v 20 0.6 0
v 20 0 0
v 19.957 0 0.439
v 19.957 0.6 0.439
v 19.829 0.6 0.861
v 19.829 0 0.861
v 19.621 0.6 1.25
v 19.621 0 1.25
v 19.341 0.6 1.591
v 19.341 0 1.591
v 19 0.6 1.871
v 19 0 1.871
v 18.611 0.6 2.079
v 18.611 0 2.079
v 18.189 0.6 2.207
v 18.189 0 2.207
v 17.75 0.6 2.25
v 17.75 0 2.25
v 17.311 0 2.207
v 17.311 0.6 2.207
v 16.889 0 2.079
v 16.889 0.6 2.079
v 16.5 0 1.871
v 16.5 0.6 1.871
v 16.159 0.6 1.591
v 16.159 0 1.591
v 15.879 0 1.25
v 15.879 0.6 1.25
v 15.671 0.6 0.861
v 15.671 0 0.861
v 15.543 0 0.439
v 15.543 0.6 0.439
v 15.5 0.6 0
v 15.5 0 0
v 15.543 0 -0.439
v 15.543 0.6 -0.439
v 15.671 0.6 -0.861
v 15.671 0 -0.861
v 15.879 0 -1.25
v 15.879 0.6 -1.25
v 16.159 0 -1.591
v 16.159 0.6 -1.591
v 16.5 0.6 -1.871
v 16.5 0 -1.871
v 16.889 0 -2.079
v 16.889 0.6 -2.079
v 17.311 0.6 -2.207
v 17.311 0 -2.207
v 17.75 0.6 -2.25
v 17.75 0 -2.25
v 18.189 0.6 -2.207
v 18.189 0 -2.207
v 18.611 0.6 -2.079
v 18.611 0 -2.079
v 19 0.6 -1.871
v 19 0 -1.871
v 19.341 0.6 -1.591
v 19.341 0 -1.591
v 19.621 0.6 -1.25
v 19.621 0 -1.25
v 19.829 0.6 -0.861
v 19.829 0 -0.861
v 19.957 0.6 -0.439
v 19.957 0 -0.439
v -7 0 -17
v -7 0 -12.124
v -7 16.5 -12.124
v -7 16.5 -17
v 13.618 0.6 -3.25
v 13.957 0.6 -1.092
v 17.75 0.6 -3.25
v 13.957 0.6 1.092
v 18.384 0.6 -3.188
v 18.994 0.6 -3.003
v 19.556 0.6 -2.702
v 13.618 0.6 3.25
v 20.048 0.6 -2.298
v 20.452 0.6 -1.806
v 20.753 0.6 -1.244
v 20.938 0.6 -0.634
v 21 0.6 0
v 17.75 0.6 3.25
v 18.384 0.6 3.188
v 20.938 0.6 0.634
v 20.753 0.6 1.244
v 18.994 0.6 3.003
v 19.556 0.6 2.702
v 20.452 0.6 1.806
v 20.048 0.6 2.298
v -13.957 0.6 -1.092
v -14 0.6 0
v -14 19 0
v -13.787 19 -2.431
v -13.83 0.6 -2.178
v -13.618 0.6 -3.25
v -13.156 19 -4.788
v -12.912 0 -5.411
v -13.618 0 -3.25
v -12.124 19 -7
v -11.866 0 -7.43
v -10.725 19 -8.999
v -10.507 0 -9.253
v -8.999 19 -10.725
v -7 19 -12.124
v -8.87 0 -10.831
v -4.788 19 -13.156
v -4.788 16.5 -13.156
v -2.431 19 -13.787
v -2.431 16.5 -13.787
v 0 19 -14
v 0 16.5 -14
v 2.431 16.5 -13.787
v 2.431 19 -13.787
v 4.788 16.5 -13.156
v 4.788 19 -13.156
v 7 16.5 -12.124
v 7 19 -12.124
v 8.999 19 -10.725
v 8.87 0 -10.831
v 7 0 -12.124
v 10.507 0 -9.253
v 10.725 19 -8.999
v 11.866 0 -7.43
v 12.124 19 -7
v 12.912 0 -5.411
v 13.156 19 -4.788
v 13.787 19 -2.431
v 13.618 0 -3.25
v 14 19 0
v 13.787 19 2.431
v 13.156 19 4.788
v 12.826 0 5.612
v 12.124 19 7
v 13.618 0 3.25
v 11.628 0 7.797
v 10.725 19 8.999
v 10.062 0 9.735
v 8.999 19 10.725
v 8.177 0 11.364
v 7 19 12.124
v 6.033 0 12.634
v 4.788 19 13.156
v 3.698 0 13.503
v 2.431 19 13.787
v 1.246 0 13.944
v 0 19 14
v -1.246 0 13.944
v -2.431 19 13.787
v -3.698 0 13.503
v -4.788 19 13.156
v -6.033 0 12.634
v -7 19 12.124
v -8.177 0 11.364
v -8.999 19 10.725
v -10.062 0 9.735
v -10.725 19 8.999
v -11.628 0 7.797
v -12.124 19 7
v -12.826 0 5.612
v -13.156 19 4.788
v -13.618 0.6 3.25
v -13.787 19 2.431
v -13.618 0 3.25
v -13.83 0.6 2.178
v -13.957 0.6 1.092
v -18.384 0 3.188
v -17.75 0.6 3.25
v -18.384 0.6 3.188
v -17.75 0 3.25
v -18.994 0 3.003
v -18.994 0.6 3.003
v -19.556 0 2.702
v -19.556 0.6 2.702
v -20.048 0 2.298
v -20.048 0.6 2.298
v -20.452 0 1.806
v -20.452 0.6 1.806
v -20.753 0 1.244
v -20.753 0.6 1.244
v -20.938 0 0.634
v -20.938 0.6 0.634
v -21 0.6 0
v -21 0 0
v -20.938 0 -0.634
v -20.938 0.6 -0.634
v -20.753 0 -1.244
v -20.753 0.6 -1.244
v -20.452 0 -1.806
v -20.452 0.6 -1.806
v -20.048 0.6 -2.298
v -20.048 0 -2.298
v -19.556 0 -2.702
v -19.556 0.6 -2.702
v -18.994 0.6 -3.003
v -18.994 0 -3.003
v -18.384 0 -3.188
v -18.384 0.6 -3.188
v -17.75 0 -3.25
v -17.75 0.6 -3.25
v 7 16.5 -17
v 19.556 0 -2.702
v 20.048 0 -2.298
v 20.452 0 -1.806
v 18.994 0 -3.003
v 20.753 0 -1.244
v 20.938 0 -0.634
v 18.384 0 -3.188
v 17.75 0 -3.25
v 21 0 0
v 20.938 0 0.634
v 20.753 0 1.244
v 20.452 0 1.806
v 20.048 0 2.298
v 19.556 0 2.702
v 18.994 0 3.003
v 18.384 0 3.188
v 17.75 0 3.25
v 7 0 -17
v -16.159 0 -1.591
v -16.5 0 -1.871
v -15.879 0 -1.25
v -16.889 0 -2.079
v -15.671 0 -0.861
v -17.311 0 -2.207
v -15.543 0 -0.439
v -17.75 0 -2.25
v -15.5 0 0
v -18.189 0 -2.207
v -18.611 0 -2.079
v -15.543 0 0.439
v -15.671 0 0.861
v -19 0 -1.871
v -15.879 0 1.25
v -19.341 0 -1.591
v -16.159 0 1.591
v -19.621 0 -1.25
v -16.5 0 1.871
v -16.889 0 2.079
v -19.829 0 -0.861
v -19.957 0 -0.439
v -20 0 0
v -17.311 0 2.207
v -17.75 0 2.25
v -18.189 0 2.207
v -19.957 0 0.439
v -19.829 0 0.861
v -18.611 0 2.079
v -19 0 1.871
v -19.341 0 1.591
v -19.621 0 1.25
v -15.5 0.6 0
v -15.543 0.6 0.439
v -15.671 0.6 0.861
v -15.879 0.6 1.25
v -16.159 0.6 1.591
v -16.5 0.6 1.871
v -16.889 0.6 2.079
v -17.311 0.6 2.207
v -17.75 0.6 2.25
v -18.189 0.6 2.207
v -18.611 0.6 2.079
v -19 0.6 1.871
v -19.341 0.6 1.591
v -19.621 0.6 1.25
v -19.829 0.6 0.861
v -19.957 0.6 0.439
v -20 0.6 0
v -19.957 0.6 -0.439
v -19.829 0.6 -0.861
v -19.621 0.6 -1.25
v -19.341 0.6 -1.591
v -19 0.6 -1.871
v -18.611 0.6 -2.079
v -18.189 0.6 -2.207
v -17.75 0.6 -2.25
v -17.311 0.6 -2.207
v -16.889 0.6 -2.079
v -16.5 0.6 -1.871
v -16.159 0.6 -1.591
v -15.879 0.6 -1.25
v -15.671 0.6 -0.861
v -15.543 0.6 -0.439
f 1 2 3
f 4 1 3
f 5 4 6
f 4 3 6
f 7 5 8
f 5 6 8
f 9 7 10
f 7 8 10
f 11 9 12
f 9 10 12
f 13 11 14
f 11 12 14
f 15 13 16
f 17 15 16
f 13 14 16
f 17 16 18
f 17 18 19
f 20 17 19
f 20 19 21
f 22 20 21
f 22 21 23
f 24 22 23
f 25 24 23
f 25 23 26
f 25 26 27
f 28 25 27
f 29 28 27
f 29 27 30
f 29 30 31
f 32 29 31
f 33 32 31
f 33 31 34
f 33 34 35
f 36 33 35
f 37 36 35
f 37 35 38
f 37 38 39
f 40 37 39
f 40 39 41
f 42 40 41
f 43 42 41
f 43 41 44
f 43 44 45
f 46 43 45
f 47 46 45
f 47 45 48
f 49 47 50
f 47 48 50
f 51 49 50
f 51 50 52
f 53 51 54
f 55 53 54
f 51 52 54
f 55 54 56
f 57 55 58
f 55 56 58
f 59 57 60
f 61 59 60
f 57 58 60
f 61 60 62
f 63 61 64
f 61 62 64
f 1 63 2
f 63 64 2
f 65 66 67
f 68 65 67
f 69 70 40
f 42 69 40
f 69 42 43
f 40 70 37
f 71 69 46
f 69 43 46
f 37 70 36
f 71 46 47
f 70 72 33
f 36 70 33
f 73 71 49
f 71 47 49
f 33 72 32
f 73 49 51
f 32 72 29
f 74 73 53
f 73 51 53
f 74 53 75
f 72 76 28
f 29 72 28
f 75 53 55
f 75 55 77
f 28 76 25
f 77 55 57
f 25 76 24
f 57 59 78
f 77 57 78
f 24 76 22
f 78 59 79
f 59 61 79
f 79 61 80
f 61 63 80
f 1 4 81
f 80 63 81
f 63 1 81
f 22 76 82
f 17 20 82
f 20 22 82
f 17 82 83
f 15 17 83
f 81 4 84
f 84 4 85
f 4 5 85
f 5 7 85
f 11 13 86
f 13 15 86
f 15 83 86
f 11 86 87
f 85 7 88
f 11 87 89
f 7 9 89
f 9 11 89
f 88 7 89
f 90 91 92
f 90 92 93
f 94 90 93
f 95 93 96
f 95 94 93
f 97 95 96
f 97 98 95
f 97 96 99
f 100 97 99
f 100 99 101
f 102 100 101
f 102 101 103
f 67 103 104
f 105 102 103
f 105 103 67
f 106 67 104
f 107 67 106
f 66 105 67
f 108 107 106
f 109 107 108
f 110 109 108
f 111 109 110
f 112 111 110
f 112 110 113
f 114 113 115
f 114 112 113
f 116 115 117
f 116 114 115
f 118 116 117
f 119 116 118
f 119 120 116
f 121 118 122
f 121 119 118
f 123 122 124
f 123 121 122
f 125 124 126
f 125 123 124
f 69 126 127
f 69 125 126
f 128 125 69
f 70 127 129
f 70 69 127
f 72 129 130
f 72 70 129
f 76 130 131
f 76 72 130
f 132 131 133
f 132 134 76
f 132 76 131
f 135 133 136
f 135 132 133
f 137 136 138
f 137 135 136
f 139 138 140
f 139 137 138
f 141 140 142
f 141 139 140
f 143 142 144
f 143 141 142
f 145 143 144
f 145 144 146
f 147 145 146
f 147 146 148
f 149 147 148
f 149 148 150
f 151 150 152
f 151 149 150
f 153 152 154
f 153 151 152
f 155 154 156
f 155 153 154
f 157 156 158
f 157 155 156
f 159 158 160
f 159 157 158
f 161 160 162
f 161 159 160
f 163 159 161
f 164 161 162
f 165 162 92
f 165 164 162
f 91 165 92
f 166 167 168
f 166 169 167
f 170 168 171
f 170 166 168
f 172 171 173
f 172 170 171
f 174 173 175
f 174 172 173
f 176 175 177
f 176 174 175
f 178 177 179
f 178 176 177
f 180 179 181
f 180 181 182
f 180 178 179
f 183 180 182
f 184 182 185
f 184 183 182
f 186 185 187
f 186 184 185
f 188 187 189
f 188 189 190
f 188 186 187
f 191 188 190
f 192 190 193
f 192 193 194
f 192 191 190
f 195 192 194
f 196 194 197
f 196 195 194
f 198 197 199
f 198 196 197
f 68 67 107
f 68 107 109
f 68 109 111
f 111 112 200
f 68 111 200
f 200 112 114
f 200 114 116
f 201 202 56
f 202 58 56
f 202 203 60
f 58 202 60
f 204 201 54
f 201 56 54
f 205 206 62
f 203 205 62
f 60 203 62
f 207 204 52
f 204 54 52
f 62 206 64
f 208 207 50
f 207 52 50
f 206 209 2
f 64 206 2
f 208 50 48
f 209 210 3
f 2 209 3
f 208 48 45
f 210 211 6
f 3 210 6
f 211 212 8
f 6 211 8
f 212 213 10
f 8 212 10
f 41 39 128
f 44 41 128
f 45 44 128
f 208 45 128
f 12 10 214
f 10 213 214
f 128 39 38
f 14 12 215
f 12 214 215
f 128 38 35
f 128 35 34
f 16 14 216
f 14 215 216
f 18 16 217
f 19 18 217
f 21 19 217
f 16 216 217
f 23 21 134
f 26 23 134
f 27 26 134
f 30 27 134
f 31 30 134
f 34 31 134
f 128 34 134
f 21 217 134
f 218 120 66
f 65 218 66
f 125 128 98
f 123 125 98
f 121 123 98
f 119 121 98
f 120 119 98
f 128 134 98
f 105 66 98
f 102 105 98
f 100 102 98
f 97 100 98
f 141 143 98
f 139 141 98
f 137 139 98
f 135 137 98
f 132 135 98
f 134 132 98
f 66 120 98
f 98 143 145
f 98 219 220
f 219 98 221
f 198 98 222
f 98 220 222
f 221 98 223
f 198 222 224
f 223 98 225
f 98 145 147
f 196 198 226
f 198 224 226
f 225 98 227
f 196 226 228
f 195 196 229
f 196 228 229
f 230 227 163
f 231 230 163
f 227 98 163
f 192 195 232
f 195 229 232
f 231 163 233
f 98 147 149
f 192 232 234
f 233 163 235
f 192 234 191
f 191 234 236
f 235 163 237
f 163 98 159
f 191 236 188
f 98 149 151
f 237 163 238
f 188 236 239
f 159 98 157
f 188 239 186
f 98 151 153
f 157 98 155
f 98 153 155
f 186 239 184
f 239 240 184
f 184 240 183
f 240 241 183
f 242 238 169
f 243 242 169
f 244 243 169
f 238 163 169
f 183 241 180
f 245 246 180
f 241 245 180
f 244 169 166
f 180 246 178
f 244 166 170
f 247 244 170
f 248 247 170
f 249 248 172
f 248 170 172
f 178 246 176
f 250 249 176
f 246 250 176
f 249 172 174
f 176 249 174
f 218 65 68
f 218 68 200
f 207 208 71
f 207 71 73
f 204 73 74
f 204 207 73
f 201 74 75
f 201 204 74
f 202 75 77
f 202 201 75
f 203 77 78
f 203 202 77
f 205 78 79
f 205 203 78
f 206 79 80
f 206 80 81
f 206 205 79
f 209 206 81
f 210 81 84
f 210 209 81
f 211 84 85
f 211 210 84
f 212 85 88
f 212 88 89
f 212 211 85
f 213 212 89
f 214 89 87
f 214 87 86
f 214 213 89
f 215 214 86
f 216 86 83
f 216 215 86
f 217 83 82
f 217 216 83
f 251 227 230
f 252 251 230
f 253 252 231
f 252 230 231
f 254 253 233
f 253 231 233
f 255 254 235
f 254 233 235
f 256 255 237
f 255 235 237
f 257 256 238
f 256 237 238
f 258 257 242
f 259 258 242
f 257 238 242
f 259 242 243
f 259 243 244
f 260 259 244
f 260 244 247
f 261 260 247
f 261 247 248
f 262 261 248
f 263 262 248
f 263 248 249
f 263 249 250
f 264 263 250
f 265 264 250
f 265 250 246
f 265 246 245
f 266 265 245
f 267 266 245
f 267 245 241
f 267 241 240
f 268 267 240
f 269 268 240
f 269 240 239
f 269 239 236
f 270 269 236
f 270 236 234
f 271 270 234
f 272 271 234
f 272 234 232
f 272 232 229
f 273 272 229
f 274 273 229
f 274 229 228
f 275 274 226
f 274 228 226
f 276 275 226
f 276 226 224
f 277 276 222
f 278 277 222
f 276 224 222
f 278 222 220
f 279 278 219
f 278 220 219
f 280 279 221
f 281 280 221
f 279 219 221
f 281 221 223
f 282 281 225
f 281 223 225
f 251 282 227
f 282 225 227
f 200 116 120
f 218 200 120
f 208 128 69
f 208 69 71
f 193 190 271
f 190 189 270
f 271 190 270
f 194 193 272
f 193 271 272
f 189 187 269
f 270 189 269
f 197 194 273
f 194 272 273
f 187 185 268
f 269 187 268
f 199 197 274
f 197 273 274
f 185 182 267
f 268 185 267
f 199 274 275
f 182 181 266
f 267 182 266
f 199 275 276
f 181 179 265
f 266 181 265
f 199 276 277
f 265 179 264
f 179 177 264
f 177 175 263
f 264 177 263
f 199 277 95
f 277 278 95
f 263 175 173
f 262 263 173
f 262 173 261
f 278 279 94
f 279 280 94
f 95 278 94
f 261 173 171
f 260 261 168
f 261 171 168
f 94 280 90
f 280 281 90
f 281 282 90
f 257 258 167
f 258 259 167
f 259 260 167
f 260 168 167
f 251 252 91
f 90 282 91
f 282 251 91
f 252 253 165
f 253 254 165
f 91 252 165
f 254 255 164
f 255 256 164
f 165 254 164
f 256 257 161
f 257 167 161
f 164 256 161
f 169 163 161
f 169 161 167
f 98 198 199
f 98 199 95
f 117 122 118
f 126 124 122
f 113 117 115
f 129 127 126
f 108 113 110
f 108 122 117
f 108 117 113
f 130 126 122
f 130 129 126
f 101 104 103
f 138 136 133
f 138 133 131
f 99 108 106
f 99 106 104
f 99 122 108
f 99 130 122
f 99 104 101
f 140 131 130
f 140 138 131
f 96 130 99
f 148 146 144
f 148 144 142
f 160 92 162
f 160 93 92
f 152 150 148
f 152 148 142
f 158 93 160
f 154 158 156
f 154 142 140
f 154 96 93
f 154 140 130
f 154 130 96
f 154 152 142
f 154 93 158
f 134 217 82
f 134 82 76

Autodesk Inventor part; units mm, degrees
ref_plane "YZ Plane" through (0, 0, 0) normal (1, 0, 0) x (0, 1, 0)
ref_plane "XZ Plane" through (0, 0, 0) normal (0, 1, 0) x (-1, 0, 0)
ref_plane "XY Plane" through (0, 0, 0) normal (0, 0, 1) x (1, 0, 0)
sketch "Esquisse1" plane through (0, 0, 0) normal (0, 1, 0) x (-1, 0, 0)
  circle A0 centre (0, 0) radius 14
  dimension "d0" = 28
extrude "Extrusion1" add sketch "Esquisse1" along normal blind 19
sketch "Esquisse2" plane through (0, 0, 0) normal (0, -1, 0) x (1, 0, 0)
  line L0 (-21, -3.25) -> (21, -3.25)
  line L1 (21, -3.25) -> (21, 3.25)
  line L2 (21, 3.25) -> (-21, 3.25)
  line L3 (-21, 3.25) -> (-21, -3.25)
  line L4 (-21, -3.25) -> (21, 3.25) construction
  line L5 (21, -3.25) -> (-21, 3.25) construction
  circle A0 centre (-17.75, 0) radius 2.25
  circle A1 centre (17.75, 0) radius 2.25
  arc A2 (-17.75, 3.25) -> (-17.75, -3.25) centre (-17.75, 0) ccw
  arc A3 (17.75, -3.25) -> (17.75, 3.25) centre (17.75, 0) ccw
  circle A4 centre (0, 0) radius 14 projected
  arc A5 (13.6175, -3.25) -> (13.6175, 3.25) centre (0, 0) ccw
  arc A6 (-13.6175, 3.25) -> (-13.6175, -3.25) centre (0, 0) ccw
  line L6 (-17.75, 3.25) -> (-13.6175, 3.25)
  line L7 (-17.75, -3.25) -> (-13.6175, -3.25)
  line L8 (13.6175, -3.25) -> (17.75, -3.25)
  line L9 (17.75, 3.25) -> (13.6175, 3.25)
  dimension "d3" = 42
  dimension "d4" = 6.5
  dimension "d5" = 4.5
  dimension "d6" = 4.5
  dimension "d7" = 3.25
  dimension "d8" = 3.25
extrude "Extrusion2" add sketch "Esquisse2" against normal blind 0.6 contours A2 L2 A4 L0 | A4 L2 A3 L0
sketch "Esquisse3" plane through (0, 0, 0) normal (0, 0, 1) x (1, 0, 0)
  line L0 (7, 0) -> (-7, 0)
  line L1 (-7, 0) -> (-7, 16.5)
  line L2 (-7, 16.5) -> (7, 16.5)
  line L3 (7, 16.5) -> (7, 0)
  point P0 (0, 0)
  dimension "d11" = 16.5
  dimension "d14" = 14
  dimension "d15" = 7
extrude "Extrusion3" add sketch "Esquisse3" against normal blind 17
properties part number "PasAPasCarcasse"
